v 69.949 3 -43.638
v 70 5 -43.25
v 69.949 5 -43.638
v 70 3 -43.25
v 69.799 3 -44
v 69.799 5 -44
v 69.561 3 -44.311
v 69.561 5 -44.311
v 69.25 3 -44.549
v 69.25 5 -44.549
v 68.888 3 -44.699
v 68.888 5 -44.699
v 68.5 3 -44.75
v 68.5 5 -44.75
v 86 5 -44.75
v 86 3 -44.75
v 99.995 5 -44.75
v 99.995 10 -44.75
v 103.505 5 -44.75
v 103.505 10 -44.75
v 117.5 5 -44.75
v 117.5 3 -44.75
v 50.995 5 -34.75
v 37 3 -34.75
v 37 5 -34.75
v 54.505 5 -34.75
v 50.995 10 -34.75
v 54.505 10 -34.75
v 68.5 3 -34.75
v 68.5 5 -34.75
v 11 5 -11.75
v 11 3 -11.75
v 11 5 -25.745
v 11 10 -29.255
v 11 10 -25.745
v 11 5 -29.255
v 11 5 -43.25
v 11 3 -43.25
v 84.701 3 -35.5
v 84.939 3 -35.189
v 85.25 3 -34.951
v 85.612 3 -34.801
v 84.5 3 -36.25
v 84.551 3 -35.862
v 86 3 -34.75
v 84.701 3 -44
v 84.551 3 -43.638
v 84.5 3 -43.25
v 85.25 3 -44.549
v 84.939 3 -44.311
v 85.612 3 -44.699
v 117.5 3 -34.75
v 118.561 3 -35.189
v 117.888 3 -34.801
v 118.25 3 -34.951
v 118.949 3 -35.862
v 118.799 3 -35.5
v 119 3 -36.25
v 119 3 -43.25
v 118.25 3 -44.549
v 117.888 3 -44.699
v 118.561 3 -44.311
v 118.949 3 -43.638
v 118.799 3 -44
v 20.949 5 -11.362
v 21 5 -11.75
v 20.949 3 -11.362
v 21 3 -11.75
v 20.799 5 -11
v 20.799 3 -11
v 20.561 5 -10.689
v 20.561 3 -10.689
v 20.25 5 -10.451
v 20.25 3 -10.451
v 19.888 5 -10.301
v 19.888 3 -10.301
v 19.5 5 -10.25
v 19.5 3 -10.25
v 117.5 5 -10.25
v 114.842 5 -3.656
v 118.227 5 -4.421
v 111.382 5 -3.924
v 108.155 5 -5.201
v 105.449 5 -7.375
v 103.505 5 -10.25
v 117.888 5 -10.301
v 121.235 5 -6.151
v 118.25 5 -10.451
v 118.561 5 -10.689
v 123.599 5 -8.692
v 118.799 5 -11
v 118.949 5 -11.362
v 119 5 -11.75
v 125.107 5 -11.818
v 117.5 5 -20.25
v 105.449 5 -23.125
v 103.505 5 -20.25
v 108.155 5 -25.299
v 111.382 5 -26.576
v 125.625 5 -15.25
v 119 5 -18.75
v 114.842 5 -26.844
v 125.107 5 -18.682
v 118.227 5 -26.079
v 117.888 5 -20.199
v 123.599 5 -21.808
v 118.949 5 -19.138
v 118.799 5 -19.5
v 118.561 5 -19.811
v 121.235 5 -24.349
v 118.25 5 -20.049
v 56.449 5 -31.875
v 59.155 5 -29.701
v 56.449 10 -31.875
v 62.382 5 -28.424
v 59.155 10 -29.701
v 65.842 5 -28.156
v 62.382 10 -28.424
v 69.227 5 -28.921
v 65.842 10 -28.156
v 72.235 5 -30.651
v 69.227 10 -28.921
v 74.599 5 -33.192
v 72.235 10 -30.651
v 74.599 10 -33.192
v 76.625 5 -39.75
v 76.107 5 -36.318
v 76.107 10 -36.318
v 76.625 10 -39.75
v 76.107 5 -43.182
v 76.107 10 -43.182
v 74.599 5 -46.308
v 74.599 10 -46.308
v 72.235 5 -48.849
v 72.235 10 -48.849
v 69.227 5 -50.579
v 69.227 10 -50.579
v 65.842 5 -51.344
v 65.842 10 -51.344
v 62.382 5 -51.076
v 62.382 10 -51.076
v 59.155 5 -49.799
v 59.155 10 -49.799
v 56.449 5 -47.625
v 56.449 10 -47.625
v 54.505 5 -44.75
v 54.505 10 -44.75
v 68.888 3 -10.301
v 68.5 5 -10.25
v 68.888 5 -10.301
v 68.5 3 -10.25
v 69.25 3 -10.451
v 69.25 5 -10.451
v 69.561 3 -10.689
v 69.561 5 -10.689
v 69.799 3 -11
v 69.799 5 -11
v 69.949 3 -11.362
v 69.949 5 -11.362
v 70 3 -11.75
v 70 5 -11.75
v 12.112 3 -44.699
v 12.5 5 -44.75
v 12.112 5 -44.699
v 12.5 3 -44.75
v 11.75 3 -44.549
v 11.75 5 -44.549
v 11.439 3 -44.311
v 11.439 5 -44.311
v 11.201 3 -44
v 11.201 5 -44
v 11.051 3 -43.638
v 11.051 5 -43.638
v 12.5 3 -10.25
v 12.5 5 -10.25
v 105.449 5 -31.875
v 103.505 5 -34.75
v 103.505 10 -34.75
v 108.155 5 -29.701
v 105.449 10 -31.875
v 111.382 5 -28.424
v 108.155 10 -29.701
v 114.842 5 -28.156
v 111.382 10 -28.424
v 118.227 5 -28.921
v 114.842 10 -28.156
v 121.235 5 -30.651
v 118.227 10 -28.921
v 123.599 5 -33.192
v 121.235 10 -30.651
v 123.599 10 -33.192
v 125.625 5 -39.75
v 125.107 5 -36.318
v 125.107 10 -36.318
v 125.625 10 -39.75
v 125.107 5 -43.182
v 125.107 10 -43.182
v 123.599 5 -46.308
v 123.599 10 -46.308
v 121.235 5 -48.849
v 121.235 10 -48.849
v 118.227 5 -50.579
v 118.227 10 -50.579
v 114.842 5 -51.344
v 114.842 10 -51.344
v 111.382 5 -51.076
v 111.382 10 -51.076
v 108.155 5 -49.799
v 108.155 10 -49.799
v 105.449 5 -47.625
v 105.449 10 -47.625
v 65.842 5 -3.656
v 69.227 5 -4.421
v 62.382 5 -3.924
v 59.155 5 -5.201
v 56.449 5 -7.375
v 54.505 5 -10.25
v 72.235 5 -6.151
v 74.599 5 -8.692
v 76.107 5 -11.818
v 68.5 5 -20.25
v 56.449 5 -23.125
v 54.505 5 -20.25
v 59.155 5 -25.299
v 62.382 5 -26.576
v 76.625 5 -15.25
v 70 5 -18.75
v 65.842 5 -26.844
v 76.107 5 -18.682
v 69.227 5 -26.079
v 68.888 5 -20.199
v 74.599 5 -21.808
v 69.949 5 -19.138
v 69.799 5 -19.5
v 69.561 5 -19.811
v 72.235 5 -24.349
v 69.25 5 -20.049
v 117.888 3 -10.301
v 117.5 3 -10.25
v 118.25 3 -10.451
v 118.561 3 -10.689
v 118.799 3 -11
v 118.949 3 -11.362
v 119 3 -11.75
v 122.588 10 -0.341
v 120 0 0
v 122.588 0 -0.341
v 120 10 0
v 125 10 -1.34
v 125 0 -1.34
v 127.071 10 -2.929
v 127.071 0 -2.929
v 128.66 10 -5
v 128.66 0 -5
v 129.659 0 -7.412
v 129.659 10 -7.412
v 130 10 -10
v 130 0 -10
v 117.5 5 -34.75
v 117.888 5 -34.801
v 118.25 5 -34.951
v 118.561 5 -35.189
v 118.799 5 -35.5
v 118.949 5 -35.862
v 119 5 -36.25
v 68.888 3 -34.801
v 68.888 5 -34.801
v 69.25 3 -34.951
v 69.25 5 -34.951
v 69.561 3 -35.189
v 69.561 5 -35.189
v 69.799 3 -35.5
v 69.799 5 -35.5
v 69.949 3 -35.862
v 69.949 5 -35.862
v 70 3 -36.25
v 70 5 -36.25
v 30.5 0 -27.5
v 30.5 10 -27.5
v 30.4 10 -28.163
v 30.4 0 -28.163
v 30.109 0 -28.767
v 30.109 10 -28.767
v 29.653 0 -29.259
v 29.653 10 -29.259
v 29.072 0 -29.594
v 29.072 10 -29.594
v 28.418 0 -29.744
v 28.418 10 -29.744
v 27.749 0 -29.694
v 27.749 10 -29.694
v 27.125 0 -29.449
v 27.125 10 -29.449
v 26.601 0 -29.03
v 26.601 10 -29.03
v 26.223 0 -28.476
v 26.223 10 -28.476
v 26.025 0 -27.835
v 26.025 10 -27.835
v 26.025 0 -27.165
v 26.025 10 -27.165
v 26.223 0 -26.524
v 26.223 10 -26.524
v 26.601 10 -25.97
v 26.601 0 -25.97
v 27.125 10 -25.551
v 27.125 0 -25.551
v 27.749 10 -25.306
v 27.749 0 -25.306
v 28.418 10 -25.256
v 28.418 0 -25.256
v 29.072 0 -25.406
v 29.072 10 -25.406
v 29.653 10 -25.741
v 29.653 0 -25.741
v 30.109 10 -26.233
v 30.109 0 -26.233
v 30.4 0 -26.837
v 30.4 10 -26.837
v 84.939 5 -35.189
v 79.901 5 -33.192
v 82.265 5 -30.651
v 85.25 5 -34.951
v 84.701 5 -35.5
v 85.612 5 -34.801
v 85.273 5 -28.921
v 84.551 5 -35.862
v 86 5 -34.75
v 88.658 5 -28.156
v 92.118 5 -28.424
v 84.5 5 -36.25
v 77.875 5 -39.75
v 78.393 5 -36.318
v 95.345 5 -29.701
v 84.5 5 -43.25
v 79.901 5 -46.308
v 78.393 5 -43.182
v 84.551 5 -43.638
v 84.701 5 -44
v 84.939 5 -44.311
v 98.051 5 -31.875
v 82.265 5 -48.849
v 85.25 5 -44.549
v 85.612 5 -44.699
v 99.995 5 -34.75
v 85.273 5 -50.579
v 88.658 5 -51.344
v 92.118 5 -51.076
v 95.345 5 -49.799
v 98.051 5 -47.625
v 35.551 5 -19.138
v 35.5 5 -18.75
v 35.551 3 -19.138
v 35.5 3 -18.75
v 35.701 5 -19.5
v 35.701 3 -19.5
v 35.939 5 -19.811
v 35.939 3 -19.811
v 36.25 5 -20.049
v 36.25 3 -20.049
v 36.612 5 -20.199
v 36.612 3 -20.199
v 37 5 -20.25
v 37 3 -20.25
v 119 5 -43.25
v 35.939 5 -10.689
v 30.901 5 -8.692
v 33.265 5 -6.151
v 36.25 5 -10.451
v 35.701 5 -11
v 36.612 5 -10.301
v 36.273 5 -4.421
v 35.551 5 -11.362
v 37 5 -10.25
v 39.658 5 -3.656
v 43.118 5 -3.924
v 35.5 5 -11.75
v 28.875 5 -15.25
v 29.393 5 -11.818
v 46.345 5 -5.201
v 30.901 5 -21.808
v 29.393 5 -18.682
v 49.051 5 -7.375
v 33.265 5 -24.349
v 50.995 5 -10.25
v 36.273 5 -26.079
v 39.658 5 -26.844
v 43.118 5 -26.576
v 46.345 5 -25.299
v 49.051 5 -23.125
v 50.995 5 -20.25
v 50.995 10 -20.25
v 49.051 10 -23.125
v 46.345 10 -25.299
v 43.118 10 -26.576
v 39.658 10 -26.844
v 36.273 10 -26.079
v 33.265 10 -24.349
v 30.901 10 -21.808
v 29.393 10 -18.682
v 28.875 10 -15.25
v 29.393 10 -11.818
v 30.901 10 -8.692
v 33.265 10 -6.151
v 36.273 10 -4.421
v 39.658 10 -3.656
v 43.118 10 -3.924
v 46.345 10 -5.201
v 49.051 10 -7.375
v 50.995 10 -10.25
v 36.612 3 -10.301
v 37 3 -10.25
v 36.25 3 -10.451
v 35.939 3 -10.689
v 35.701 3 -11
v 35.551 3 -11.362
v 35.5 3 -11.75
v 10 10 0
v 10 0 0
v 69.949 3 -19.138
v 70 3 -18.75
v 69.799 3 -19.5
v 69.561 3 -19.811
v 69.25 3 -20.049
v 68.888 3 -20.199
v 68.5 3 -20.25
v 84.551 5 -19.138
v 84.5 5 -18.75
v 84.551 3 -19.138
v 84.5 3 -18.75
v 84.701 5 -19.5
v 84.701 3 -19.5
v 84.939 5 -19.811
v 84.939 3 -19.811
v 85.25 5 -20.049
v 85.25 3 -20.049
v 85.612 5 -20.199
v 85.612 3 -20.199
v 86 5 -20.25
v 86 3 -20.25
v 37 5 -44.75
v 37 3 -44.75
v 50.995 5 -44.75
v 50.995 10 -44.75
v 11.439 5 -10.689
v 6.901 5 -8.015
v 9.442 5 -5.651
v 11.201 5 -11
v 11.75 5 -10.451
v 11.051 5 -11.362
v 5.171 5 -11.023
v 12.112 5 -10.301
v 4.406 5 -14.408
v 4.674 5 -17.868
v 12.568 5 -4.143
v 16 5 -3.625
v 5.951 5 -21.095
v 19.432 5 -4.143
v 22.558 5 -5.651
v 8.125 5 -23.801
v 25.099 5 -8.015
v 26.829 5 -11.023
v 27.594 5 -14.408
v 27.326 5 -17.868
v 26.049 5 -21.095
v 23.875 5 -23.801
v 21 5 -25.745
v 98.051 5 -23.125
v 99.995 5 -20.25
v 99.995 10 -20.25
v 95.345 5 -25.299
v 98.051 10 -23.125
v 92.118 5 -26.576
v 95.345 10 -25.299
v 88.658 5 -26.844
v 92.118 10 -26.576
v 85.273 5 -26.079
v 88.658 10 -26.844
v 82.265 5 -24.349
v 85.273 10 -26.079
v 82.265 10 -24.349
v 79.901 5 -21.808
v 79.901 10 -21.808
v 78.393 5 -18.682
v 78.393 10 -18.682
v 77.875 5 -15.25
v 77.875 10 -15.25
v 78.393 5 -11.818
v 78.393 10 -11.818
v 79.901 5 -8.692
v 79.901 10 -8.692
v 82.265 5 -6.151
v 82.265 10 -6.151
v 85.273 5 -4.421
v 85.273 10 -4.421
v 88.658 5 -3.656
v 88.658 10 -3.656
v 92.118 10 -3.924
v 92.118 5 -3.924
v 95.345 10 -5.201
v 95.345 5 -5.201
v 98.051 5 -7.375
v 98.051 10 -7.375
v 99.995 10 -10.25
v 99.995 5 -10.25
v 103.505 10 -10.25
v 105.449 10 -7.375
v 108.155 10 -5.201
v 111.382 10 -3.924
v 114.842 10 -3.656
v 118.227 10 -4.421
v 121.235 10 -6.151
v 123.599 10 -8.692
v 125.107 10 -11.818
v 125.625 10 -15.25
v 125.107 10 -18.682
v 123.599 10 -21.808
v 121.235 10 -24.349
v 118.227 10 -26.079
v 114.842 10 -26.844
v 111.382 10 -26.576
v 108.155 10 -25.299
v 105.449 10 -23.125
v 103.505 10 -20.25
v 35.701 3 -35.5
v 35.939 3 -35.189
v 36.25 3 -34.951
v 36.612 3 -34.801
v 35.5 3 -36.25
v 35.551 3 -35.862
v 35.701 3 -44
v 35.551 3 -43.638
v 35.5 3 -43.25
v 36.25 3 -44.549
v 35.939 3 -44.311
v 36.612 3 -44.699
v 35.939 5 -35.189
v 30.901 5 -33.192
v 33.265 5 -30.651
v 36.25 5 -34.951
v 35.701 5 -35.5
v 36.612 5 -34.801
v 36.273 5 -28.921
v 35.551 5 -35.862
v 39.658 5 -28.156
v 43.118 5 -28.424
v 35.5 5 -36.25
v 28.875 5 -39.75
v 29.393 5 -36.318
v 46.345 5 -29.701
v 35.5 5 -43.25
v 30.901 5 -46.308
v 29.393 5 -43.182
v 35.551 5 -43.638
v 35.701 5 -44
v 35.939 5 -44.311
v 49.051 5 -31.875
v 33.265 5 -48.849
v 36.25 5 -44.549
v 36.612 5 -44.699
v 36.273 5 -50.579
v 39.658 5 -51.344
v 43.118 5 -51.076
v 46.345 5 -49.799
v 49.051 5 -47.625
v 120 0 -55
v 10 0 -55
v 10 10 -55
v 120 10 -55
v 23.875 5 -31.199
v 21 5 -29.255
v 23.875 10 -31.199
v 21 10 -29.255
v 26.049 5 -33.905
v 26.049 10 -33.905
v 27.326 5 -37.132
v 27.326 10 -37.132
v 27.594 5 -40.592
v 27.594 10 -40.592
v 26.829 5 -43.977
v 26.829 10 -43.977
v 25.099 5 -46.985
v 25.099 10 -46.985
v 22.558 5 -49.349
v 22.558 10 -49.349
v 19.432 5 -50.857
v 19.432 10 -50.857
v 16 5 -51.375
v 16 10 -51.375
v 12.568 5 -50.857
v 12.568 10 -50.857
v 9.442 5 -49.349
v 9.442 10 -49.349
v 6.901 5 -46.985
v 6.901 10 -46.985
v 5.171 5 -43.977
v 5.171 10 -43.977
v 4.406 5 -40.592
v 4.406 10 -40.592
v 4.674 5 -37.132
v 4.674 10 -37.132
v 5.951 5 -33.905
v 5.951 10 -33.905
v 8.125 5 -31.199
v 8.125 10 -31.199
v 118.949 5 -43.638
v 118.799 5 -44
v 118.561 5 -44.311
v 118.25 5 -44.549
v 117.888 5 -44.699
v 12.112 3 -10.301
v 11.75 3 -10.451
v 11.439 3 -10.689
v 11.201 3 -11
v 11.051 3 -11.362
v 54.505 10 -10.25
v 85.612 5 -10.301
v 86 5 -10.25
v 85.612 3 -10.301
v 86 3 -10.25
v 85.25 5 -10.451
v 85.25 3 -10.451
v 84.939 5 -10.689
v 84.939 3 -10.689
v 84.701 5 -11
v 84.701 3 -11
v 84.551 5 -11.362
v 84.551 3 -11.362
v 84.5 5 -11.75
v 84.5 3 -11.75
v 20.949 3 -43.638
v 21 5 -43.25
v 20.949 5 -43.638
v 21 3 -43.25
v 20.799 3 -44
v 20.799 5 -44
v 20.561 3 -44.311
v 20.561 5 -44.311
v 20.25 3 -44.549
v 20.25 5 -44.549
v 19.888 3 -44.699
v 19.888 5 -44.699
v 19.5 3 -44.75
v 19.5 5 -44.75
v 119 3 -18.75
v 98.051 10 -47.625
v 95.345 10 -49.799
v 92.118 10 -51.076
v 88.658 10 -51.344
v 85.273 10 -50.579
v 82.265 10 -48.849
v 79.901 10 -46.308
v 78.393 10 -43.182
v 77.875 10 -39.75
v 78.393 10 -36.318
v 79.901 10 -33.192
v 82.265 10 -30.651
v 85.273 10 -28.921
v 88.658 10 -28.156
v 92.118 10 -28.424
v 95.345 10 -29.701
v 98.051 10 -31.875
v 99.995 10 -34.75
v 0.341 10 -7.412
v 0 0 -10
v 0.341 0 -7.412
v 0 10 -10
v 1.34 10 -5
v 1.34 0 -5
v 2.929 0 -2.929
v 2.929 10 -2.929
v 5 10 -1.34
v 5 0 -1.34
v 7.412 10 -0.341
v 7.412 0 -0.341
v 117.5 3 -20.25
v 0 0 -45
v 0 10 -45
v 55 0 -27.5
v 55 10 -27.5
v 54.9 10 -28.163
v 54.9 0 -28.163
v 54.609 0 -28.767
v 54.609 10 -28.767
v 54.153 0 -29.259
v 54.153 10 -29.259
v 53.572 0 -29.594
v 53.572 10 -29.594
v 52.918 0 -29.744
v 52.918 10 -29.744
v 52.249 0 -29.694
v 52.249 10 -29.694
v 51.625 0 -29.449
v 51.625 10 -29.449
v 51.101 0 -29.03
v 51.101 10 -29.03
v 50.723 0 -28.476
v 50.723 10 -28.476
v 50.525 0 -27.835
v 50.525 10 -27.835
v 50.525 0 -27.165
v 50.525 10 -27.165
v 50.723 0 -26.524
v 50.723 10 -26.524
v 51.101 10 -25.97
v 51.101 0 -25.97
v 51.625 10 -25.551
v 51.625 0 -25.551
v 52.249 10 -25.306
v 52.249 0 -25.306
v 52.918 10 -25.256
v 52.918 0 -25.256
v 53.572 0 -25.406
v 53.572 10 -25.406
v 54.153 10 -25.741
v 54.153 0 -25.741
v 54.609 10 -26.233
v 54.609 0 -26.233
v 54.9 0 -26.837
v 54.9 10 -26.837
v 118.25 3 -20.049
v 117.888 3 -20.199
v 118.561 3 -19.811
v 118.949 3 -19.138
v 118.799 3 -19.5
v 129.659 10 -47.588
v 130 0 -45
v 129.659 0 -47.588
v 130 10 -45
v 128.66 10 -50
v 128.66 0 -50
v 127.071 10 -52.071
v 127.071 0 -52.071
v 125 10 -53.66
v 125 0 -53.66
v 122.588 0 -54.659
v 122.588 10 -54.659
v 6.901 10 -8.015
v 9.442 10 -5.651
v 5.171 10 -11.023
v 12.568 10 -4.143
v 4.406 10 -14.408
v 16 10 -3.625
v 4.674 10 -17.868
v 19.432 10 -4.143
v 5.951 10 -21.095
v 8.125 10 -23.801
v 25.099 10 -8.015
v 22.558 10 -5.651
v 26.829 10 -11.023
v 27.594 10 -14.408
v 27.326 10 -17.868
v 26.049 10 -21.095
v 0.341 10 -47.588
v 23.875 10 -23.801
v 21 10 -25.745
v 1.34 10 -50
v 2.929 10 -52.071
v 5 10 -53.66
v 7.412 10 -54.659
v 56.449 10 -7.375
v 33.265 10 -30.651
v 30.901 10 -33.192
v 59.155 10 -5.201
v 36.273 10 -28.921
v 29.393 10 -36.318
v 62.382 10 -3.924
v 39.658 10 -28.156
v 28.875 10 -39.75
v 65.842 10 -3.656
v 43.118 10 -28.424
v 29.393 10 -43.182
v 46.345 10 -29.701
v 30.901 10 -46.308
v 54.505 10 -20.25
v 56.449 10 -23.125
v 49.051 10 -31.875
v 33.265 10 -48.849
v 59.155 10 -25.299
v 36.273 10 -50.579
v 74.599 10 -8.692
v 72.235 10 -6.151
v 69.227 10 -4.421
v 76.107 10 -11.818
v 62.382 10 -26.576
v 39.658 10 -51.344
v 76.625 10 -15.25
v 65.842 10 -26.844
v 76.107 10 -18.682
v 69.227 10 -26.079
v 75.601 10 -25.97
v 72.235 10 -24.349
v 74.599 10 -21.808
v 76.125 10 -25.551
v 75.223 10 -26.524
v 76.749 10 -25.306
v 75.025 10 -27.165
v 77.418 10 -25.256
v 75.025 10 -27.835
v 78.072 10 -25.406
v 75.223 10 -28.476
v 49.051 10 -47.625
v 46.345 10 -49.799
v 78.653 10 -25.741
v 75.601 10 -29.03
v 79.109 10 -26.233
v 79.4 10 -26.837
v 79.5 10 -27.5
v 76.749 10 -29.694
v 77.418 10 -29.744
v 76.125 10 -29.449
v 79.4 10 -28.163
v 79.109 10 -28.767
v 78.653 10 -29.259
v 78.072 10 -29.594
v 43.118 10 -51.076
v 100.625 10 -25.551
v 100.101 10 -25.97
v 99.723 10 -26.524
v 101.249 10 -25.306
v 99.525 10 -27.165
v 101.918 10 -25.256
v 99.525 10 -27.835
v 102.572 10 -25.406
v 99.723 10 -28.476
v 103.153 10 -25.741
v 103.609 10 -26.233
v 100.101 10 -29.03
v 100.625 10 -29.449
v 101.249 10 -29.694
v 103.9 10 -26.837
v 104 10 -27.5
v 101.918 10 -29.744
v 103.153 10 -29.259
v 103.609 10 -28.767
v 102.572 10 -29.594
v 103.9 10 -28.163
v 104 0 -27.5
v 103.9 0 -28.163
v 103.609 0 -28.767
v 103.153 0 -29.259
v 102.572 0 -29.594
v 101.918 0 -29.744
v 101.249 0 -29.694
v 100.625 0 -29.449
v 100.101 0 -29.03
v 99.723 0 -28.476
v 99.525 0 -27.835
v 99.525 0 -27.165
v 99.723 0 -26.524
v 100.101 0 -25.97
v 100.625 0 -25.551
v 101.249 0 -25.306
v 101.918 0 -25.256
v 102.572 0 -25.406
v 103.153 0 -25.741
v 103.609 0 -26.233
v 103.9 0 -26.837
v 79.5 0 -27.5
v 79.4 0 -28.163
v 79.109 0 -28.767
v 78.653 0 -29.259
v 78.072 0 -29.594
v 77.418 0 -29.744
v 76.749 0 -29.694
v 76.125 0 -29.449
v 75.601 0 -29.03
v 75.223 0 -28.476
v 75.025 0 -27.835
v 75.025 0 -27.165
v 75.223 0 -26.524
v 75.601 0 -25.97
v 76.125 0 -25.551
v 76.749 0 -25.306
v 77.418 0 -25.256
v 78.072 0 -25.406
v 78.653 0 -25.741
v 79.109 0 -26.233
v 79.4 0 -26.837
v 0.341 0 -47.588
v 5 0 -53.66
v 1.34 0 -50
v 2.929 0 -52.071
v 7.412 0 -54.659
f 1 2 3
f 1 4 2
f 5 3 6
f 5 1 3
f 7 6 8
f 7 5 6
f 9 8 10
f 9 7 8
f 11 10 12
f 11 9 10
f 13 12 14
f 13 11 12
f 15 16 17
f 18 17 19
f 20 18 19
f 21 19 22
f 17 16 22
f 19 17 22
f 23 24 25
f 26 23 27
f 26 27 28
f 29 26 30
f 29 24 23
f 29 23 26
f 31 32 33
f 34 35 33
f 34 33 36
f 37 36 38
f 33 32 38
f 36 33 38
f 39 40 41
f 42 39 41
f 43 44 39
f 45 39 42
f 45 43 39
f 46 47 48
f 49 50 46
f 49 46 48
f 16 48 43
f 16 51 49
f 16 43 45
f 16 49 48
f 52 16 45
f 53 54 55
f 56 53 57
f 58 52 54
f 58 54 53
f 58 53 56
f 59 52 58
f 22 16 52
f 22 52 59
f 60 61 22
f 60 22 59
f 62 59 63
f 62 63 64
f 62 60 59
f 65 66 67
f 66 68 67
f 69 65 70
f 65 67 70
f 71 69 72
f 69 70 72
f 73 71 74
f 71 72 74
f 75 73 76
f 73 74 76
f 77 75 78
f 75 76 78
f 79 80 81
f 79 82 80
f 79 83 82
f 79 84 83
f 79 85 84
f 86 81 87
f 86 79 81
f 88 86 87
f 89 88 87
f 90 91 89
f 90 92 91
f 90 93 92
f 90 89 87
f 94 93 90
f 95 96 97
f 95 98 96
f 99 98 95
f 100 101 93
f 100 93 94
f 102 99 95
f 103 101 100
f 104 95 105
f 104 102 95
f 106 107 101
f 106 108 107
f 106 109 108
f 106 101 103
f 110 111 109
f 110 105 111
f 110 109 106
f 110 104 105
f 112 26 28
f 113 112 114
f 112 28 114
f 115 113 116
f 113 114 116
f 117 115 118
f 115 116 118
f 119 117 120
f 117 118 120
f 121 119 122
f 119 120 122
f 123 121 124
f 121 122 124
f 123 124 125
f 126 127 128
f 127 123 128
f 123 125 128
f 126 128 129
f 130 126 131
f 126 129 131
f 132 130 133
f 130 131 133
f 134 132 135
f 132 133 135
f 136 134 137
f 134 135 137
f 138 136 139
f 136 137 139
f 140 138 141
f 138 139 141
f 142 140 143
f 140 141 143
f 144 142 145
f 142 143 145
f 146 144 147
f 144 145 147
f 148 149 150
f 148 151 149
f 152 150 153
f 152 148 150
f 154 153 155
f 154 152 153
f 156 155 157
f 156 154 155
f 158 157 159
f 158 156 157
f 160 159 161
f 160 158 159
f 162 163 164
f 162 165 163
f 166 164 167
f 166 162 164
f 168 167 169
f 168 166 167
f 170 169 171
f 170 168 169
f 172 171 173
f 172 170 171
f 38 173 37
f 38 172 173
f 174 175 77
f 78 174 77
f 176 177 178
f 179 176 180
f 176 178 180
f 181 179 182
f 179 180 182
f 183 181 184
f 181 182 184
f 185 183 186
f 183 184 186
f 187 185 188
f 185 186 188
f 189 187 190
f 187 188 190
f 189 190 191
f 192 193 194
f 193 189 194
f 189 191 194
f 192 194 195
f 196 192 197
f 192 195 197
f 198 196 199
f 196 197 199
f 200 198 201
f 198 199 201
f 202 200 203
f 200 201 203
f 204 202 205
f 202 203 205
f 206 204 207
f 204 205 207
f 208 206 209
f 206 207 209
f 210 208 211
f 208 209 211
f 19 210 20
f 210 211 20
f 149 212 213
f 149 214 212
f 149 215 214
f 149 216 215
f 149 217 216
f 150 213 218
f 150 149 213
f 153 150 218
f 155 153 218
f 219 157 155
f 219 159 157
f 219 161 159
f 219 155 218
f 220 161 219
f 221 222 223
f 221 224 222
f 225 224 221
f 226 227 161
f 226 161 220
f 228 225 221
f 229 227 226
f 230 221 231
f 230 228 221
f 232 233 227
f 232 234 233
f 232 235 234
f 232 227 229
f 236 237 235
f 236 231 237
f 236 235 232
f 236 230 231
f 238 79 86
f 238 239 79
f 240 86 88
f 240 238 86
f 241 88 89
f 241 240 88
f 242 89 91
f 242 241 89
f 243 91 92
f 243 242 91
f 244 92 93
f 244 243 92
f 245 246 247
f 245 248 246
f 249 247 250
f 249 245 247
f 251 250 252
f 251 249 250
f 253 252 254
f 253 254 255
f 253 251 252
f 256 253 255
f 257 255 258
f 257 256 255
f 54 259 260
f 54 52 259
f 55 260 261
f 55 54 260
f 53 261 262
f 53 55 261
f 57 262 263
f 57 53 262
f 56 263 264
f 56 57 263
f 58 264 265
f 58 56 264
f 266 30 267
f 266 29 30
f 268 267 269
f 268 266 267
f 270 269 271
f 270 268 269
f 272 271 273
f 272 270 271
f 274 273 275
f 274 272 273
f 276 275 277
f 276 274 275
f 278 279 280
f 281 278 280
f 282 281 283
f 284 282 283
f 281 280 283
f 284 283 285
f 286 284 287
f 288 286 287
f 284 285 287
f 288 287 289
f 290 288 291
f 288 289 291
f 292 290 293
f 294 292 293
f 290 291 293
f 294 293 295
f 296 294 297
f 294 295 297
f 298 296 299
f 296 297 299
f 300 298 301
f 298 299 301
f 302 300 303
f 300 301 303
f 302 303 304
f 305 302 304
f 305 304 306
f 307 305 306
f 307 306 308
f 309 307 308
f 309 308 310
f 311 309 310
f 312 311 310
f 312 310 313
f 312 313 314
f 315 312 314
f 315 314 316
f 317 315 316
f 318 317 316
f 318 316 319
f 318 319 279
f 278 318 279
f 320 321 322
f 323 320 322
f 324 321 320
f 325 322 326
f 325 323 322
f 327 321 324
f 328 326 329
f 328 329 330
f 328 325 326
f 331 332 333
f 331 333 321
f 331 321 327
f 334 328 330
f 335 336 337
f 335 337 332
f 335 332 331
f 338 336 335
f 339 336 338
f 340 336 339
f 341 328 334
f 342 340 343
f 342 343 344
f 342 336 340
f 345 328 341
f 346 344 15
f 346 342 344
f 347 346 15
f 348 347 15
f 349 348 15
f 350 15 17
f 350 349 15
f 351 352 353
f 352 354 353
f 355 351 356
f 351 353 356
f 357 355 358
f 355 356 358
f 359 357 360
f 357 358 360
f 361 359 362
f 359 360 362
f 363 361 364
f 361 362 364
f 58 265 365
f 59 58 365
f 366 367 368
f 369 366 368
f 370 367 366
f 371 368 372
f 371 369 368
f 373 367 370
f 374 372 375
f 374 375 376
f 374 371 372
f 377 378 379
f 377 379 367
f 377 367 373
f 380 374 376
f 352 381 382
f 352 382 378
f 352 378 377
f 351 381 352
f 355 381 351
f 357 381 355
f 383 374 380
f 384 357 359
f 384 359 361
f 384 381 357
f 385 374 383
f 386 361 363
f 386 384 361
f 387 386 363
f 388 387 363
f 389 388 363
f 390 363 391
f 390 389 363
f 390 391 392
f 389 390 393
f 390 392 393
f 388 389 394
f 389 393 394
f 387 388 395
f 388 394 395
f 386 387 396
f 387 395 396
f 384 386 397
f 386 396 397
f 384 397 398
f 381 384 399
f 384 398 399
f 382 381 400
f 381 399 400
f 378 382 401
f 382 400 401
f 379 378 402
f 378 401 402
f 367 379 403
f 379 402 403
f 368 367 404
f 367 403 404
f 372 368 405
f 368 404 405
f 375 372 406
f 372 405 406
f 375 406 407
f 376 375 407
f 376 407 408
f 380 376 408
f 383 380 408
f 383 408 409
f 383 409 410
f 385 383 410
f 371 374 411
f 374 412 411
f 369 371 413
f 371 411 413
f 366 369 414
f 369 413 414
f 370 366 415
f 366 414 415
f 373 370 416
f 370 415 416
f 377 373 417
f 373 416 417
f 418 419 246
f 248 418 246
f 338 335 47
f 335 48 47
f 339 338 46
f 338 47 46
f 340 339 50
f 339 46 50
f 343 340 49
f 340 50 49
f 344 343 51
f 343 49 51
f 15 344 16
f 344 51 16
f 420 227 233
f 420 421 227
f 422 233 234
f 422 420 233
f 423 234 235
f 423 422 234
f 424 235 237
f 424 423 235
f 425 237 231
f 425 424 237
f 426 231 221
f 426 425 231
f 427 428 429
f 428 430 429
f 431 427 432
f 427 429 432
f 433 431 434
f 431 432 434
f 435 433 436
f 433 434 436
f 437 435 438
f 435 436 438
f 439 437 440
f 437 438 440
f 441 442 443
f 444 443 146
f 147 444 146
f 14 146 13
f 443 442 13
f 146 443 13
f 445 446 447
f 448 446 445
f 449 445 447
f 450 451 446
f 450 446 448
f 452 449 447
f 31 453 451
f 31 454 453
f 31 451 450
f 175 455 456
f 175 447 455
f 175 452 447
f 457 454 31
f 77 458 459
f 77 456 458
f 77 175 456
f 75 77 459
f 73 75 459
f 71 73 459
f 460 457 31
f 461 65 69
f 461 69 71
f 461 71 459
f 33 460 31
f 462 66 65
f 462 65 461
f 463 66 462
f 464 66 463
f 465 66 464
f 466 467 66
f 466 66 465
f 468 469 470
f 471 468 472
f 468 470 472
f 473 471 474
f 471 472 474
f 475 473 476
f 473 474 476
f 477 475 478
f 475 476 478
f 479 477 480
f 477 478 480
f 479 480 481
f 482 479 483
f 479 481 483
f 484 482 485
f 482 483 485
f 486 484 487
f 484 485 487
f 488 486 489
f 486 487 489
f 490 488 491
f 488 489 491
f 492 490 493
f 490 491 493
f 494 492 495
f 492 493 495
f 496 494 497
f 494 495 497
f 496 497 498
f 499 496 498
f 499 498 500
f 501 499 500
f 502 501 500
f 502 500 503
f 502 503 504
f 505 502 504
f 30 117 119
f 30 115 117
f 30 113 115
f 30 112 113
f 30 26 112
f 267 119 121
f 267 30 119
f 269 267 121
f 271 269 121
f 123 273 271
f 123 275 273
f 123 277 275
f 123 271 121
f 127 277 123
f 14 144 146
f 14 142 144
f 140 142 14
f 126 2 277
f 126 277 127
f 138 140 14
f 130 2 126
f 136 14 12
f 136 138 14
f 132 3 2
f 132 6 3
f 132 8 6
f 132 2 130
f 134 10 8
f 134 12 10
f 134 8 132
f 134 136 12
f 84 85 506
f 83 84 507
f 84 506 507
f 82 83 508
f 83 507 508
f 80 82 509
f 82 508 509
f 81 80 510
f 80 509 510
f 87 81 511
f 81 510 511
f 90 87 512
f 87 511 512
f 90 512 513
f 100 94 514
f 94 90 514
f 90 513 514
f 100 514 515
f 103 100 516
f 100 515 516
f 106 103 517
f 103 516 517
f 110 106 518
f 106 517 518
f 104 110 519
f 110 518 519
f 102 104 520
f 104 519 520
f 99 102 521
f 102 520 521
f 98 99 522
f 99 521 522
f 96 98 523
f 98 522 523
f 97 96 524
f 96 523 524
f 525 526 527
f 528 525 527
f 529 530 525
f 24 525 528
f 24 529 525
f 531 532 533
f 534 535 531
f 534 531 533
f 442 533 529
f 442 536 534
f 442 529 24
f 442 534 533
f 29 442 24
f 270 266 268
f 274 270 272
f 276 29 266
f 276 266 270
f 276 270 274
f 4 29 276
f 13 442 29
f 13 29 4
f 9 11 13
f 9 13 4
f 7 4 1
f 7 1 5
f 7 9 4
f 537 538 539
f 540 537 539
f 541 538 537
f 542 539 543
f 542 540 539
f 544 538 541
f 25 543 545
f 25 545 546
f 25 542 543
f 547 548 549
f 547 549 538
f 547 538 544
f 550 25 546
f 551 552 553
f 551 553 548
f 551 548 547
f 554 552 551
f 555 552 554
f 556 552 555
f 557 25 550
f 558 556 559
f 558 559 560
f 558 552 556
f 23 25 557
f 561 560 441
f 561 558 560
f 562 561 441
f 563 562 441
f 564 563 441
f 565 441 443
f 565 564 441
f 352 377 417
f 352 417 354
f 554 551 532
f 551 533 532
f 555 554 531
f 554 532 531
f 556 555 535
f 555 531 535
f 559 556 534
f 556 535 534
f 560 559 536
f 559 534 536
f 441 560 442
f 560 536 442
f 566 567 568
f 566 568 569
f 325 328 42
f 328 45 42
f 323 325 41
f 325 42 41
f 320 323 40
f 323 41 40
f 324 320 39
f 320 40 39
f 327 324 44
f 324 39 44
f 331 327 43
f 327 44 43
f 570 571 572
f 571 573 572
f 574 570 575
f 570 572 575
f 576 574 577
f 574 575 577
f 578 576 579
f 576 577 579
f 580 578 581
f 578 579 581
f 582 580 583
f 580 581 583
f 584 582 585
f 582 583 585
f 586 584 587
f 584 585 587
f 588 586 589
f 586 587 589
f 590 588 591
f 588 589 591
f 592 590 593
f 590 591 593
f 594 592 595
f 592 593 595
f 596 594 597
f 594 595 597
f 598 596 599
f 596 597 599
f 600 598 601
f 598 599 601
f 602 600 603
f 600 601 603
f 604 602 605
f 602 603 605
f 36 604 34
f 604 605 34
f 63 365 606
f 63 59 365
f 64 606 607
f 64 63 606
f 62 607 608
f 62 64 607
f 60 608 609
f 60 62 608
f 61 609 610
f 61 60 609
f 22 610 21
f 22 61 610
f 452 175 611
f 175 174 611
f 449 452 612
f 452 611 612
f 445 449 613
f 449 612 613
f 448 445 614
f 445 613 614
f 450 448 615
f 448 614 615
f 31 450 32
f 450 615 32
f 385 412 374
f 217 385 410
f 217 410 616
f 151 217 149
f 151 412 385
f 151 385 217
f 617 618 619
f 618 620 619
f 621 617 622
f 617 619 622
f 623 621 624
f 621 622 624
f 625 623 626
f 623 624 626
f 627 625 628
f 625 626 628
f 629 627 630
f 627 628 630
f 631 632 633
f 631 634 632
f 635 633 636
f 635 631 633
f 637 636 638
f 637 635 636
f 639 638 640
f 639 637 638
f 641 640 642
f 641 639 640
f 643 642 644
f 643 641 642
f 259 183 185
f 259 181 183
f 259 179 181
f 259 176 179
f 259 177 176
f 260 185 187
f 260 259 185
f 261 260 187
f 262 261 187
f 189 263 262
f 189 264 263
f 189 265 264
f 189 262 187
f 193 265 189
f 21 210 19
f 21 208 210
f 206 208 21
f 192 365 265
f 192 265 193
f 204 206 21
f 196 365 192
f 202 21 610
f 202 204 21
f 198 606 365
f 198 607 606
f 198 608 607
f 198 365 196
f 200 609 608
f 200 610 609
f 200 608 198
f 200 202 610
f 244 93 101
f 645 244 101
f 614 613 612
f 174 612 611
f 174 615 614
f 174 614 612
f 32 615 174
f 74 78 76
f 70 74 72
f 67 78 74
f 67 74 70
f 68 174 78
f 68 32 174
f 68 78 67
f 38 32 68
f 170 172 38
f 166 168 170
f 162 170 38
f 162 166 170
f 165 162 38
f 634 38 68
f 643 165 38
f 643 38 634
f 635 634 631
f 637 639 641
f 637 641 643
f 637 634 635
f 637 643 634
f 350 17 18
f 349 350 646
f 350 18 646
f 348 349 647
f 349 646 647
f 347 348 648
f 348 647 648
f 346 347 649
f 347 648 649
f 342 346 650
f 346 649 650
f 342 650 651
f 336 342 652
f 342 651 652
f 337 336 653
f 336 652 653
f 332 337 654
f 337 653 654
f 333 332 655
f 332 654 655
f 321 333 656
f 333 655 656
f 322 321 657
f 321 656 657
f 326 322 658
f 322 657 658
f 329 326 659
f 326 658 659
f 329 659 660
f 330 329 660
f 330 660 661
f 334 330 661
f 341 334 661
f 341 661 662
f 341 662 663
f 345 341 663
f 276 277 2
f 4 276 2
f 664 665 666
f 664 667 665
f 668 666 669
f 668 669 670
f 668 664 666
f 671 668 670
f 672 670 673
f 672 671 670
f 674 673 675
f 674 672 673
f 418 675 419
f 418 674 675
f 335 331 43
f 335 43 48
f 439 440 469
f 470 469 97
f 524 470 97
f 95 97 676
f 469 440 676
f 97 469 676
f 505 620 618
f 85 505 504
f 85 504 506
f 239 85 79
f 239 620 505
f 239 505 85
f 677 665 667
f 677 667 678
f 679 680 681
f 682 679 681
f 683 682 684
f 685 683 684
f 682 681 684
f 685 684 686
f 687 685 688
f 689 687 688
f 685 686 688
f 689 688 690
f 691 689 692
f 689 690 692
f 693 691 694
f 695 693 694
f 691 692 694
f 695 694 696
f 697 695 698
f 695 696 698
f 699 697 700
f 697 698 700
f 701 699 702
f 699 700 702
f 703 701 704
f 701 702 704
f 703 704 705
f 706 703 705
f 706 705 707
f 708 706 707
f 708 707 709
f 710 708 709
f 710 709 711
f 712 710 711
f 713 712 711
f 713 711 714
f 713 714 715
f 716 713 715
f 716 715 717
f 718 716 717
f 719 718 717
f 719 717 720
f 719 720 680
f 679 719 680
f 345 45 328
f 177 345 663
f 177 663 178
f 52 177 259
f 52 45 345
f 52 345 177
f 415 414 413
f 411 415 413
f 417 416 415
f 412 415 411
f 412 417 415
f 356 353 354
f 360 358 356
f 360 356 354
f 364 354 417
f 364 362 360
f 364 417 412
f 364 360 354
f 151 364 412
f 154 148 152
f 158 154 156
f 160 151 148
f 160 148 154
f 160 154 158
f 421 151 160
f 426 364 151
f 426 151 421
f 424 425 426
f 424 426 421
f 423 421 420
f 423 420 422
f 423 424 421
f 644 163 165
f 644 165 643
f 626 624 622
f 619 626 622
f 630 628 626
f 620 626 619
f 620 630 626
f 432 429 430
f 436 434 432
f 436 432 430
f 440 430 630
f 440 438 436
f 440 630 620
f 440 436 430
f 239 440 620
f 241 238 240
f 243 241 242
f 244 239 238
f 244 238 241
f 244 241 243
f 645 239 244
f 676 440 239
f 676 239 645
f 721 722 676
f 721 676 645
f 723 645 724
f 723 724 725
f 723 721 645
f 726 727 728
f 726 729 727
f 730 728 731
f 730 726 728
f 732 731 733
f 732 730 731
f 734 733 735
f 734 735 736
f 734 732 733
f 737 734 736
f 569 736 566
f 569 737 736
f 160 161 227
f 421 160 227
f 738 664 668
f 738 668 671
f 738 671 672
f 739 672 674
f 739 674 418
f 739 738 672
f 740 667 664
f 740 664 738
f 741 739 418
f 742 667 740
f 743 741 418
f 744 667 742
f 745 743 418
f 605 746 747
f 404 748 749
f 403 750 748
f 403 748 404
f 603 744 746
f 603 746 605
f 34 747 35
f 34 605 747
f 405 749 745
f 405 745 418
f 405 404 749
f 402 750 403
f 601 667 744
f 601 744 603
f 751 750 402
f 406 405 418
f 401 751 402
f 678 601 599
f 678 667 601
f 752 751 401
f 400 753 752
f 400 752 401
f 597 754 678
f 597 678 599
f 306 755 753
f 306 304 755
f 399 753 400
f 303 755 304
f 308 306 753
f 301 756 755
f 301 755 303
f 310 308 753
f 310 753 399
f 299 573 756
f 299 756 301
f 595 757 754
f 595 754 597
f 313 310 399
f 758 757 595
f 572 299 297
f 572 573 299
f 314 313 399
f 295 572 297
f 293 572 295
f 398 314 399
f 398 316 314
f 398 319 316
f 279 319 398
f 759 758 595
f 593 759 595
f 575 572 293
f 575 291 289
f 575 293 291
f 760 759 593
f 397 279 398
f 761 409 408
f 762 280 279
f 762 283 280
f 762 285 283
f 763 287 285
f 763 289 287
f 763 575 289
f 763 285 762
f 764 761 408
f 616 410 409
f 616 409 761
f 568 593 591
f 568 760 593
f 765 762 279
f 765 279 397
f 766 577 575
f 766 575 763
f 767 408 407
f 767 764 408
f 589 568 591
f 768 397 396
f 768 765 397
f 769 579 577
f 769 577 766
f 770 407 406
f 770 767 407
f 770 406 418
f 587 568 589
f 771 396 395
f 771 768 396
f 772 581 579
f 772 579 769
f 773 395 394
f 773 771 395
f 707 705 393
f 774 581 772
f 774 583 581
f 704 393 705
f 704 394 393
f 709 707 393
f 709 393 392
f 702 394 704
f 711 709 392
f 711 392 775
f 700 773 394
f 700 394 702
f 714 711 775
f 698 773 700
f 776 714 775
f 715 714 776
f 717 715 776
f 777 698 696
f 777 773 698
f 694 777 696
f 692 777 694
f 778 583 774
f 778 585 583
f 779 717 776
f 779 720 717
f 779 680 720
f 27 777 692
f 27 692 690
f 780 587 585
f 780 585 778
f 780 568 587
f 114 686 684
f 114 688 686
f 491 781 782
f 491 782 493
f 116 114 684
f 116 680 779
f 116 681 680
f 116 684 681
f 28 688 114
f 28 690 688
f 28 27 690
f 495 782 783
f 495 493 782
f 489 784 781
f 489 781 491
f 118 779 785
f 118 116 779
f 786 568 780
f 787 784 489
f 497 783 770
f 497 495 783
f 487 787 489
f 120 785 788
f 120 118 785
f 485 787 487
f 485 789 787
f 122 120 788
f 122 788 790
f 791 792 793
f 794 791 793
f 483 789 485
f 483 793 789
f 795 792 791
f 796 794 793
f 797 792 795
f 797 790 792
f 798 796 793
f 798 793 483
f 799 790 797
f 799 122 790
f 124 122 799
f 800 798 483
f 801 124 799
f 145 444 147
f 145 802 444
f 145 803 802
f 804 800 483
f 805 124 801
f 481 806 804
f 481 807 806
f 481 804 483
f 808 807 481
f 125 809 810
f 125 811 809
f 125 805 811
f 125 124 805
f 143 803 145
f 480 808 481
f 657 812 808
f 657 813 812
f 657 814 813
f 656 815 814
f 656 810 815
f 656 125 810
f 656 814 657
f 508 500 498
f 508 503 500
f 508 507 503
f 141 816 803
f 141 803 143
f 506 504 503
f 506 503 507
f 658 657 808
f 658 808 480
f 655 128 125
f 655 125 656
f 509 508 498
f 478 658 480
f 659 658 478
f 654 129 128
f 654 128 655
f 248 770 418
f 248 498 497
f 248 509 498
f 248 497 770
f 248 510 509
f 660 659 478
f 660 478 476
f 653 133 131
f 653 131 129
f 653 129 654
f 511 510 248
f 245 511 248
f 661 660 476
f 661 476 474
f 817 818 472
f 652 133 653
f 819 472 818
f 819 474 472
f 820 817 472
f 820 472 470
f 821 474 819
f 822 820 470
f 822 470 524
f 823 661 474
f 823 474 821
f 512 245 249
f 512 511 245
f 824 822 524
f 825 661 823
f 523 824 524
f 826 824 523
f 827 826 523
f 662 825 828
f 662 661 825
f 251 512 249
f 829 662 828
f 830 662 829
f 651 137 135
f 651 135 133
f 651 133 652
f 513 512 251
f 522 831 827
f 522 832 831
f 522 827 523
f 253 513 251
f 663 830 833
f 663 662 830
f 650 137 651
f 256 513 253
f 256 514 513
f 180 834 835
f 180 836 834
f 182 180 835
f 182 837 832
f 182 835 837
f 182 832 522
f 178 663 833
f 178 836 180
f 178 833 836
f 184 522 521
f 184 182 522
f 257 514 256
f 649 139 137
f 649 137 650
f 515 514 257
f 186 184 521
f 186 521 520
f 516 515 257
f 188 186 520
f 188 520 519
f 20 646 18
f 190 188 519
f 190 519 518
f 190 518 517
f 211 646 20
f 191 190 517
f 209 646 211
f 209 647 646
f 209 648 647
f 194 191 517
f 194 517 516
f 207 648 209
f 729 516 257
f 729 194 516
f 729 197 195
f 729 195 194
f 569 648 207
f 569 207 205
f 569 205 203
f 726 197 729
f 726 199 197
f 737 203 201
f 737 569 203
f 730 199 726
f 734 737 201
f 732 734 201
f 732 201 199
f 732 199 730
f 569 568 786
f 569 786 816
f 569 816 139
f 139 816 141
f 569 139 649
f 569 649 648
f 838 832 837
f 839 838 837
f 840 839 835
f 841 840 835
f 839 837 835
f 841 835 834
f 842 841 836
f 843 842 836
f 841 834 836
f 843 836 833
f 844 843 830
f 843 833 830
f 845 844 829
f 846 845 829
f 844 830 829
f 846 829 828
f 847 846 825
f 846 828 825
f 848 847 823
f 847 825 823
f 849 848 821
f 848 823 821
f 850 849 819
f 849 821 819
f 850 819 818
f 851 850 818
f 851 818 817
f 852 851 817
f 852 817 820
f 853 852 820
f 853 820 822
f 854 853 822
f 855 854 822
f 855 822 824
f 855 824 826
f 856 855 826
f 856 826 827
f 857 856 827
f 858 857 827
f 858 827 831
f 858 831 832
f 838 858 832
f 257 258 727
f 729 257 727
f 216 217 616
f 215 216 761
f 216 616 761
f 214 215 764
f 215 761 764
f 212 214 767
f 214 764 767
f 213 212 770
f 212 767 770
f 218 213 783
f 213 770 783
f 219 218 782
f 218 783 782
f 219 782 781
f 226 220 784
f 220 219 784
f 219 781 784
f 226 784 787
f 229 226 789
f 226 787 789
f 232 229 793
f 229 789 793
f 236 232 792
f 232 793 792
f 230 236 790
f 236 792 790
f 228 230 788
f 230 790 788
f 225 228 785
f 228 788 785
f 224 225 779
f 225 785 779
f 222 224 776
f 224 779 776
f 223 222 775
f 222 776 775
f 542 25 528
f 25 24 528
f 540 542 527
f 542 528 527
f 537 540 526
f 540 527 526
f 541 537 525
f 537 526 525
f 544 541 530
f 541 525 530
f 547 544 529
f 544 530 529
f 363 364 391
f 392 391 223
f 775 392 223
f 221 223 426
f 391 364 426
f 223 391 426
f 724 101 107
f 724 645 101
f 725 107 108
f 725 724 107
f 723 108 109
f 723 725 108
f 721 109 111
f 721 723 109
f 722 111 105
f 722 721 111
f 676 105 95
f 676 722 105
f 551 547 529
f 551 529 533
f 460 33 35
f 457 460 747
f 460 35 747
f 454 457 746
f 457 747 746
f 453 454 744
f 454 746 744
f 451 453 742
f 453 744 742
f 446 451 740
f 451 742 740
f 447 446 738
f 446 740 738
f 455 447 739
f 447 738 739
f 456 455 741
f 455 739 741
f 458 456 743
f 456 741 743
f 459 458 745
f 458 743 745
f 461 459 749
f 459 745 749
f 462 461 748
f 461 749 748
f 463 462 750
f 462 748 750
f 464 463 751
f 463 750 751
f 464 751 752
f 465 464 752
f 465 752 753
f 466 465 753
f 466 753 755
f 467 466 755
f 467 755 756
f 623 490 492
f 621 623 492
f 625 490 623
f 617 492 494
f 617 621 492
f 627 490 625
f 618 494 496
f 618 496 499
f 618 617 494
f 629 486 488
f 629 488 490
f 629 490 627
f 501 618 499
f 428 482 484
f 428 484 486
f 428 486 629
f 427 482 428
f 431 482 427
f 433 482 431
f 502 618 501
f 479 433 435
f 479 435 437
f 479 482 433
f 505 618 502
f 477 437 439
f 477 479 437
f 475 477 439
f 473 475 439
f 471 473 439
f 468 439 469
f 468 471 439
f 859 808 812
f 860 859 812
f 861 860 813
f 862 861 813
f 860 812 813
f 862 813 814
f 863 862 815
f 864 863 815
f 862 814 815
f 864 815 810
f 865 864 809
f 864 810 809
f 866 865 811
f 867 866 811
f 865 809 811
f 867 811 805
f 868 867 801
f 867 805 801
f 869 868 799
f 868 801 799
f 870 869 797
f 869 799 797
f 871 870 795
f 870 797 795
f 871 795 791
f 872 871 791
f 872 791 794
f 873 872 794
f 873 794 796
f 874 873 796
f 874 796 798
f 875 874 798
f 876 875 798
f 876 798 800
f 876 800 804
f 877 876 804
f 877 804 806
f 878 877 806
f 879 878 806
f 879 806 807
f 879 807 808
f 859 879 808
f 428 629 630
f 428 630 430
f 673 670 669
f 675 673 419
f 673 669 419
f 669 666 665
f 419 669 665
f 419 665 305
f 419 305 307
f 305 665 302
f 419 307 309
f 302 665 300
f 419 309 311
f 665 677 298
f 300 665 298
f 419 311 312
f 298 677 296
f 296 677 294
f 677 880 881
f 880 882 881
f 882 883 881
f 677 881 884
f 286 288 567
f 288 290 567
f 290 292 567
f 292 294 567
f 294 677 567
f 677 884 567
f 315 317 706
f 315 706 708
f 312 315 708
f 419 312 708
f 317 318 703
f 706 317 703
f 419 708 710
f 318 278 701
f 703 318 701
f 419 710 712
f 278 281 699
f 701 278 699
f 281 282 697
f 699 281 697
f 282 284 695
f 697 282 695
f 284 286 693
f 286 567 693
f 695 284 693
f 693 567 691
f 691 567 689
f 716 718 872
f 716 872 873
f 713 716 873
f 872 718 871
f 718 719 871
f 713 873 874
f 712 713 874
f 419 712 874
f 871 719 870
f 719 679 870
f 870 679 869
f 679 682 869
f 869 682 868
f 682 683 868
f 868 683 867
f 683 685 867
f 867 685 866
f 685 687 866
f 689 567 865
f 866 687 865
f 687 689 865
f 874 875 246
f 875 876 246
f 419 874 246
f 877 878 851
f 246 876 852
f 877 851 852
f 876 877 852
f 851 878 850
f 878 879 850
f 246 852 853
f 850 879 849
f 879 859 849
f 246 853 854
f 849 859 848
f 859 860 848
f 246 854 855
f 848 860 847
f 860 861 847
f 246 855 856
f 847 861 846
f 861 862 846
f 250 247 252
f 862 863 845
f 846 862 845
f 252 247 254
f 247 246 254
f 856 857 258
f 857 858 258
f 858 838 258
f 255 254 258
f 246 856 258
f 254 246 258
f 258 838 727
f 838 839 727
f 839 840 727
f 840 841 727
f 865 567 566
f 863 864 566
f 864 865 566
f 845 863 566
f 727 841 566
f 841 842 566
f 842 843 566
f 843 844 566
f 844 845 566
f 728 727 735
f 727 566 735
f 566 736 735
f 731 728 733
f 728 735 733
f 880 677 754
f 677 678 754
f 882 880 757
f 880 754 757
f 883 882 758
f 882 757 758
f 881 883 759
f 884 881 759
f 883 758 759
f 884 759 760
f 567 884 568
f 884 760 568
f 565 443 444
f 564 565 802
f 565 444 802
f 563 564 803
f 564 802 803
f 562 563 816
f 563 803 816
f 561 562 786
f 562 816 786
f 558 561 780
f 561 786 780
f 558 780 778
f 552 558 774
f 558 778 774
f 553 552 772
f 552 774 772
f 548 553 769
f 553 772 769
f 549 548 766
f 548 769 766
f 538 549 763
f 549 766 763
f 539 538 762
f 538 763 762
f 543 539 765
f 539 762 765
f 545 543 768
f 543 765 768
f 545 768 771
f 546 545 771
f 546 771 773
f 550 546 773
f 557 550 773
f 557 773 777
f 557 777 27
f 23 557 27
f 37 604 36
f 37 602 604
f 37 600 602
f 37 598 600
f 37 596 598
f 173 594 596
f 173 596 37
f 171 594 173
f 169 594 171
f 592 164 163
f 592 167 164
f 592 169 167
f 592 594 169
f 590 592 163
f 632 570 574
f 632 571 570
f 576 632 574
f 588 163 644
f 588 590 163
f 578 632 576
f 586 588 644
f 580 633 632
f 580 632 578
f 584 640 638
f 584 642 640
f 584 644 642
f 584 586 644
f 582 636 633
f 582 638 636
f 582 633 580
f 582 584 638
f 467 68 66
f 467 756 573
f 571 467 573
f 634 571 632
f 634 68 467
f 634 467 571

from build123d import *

# Parameters (mm, degrees)
SKIZZE1_W                                   = 130
SKIZZE1_H                                   = 55
AUFSATZ_LINEAR_AUSTRAGEN1_DEPTH             = 10
VERRUNDUNG1_R                               = 10
DURCHGANGSLOCH_F_R_M41_D                    = 4.5
SKIZZE3_R                                   = 11.625
SCHNITT_LINEAR_AUSTRAGEN1_DEPTH             = 5
SKIZZE8_W                                   = 34.5
SKIZZE8_H                                   = 10
SKIZZE8_W_2                                 = 10
SKIZZE8_H_2                                 = 34.5
SCHNITT_LINEAR_AUSTRAGEN3_DEPTH             = 2
SCHNITT_LINEAR_AUSTRAGEN3_DIRECTION_2_REACH = 7
VERRUNDUNG3_R                               = 1.5


with BuildPart() as part:
    # Skizze1 → Aufsatz-Linear austragen1 (new body)
    with BuildSketch(Plane(origin=(0, 0, 0), x_dir=(1, 0, 0), z_dir=(0, 1, 0))):
        with Locations((65, 27.5)):
            Rectangle(SKIZZE1_W, SKIZZE1_H)
    extrude(amount=AUFSATZ_LINEAR_AUSTRAGEN1_DEPTH)

    # Verrundung1
    verrundung1_edges = [part.edges().sort_by_distance(p)[0] for p in [
        (0, 5, -55),
        (130, 5, -55),
        (130, 5, 0),
        (0, 5, 0),
    ]]
    fillet(verrundung1_edges, radius=VERRUNDUNG1_R)

    # Durchgangsloch für M41 (through all)
    with Locations(Plane(origin=(0, 0, 0), x_dir=(-1, 0, 0), z_dir=(0, -1, 0))):
        with Locations((-77.25, 27.5), (-52.75, 27.5), (-28.25, 27.5), (-101.75, 27.5)):
            Hole(DURCHGANGSLOCH_F_R_M41_D / 2)

    # Skizze3 → Schnitt-Linear austragen1 (cut)
    with BuildSketch(Plane(origin=(0, 10, 0), x_dir=(1, 0, 0), z_dir=(0, 1, 0))):
        with Locations((16, 15.25)):
            Circle(SKIZZE3_R)
        with Locations((40.5, 15.25)):
            Circle(SKIZZE3_R)
        with Locations((65, 15.25)):
            Circle(SKIZZE3_R)
        with Locations((89.5, 15.25)):
            Circle(SKIZZE3_R)
        with Locations((114, 15.25)):
            Circle(SKIZZE3_R)
        with Locations((40.5, 39.75)):
            Circle(SKIZZE3_R)
        with Locations((65, 39.75)):
            Circle(SKIZZE3_R)
        with Locations((89.5, 39.75)):
            Circle(SKIZZE3_R)
        with Locations((114, 39.75)):
            Circle(SKIZZE3_R)
        with Locations((16, 39.75)):
            Circle(SKIZZE3_R)
    extrude(amount=-SCHNITT_LINEAR_AUSTRAGEN1_DEPTH, mode=Mode.SUBTRACT)

    # Skizze8 → Schnitt-Linear austragen3 (cut)
    with BuildSketch(Plane(origin=(0, 5, 0), x_dir=(1, 0, 0), z_dir=(0, 1, 0))):
        with Locations((101.75, 39.75)):
            Rectangle(SKIZZE8_W, SKIZZE8_H)
        with Locations((101.75, 15.25)):
            Rectangle(SKIZZE8_W, SKIZZE8_H)
        with Locations((52.75, 39.75)):
            Rectangle(SKIZZE8_W, SKIZZE8_H)
        with Locations((52.75, 15.25)):
            Rectangle(SKIZZE8_W, SKIZZE8_H)
        with Locations((16, 27.5)):
            Rectangle(SKIZZE8_W_2, SKIZZE8_H_2)
    extrude(amount=-SCHNITT_LINEAR_AUSTRAGEN3_DEPTH, mode=Mode.SUBTRACT)

    # Skizze8 → Schnitt-Linear austragen3 direction 2 (cut, up to next)
    with BuildSketch(Plane(origin=(0, 5, 0), x_dir=(1, 0, 0), z_dir=(0, 1, 0)), mode=Mode.PRIVATE) as schnitt_linear_austragen3_direction_2_sk1:
        with Locations((101.75, 39.75)):
            Rectangle(SKIZZE8_W, SKIZZE8_H)
    schnitt_linear_austragen3_direction_2_tool1 = extrude(schnitt_linear_austragen3_direction_2_sk1.sketch, amount=SCHNITT_LINEAR_AUSTRAGEN3_DIRECTION_2_REACH, mode=Mode.PRIVATE) & part.part
    add(schnitt_linear_austragen3_direction_2_tool1.solids().sort_by_distance((101.75, 5, -39.75))[0], mode=Mode.SUBTRACT)
    # Skizze8 → Schnitt-Linear austragen3 direction 2 (cut, up to next)
    with BuildSketch(Plane(origin=(0, 5, 0), x_dir=(1, 0, 0), z_dir=(0, 1, 0)), mode=Mode.PRIVATE) as schnitt_linear_austragen3_direction_2_sk2:
        with Locations((101.75, 15.25)):
            Rectangle(SKIZZE8_W, SKIZZE8_H)
    schnitt_linear_austragen3_direction_2_tool2 = extrude(schnitt_linear_austragen3_direction_2_sk2.sketch, amount=SCHNITT_LINEAR_AUSTRAGEN3_DIRECTION_2_REACH, mode=Mode.PRIVATE) & part.part
    add(schnitt_linear_austragen3_direction_2_tool2.solids().sort_by_distance((101.75, 5, -15.25))[0], mode=Mode.SUBTRACT)
    # Skizze8 → Schnitt-Linear austragen3 direction 2 (cut, up to next)
    with BuildSketch(Plane(origin=(0, 5, 0), x_dir=(1, 0, 0), z_dir=(0, 1, 0)), mode=Mode.PRIVATE) as schnitt_linear_austragen3_direction_2_sk3:
        with Locations((52.75, 39.75)):
            Rectangle(SKIZZE8_W, SKIZZE8_H)
    schnitt_linear_austragen3_direction_2_tool3 = extrude(schnitt_linear_austragen3_direction_2_sk3.sketch, amount=SCHNITT_LINEAR_AUSTRAGEN3_DIRECTION_2_REACH, mode=Mode.PRIVATE) & part.part
    add(schnitt_linear_austragen3_direction_2_tool3.solids().sort_by_distance((52.75, 5, -39.75))[0], mode=Mode.SUBTRACT)
    # Skizze8 → Schnitt-Linear austragen3 direction 2 (cut, up to next)
    with BuildSketch(Plane(origin=(0, 5, 0), x_dir=(1, 0, 0), z_dir=(0, 1, 0)), mode=Mode.PRIVATE) as schnitt_linear_austragen3_direction_2_sk4:
        with Locations((52.75, 15.25)):
            Rectangle(SKIZZE8_W, SKIZZE8_H)
    schnitt_linear_austragen3_direction_2_tool4 = extrude(schnitt_linear_austragen3_direction_2_sk4.sketch, amount=SCHNITT_LINEAR_AUSTRAGEN3_DIRECTION_2_REACH, mode=Mode.PRIVATE) & part.part
    add(schnitt_linear_austragen3_direction_2_tool4.solids().sort_by_distance((52.75, 5, -15.25))[0], mode=Mode.SUBTRACT)
    # Skizze8 → Schnitt-Linear austragen3 direction 2 (cut, up to next)
    with BuildSketch(Plane(origin=(0, 5, 0), x_dir=(1, 0, 0), z_dir=(0, 1, 0)), mode=Mode.PRIVATE) as schnitt_linear_austragen3_direction_2_sk5:
        with Locations((16, 27.5)):
            Rectangle(SKIZZE8_W_2, SKIZZE8_H_2)
    schnitt_linear_austragen3_direction_2_tool5 = extrude(schnitt_linear_austragen3_direction_2_sk5.sketch, amount=SCHNITT_LINEAR_AUSTRAGEN3_DIRECTION_2_REACH, mode=Mode.PRIVATE) & part.part
    add(schnitt_linear_austragen3_direction_2_tool5.solids().sort_by_distance((16, 5, -27.5))[0], mode=Mode.SUBTRACT)

    # Verrundung3
    verrundung3_edges = [part.edges().sort_by_distance(p)[0] for p in [
        (21, 4, -44.75),
        (70, 4, -20.25),
        (70, 4, -44.75),
        (119, 4, -44.75),
        (119, 4, -20.25),
        (11, 4, -10.25),
        (35.5, 4, -34.75),
        (84.5, 4, -34.75),
        (84.5, 4, -10.25),
        (35.5, 4, -10.25),
        (21, 4, -10.25),
        (70, 4, -34.75),
        (70, 4, -10.25),
        (119, 4, -34.75),
        (119, 4, -10.25),
        (35.5, 4, -20.25),
        (84.5, 4, -20.25),
        (84.5, 4, -44.75),
        (35.5, 4, -44.75),
        (11, 4, -44.75),
    ]]
    fillet(verrundung3_edges, radius=VERRUNDUNG3_R)


solid = part.part
